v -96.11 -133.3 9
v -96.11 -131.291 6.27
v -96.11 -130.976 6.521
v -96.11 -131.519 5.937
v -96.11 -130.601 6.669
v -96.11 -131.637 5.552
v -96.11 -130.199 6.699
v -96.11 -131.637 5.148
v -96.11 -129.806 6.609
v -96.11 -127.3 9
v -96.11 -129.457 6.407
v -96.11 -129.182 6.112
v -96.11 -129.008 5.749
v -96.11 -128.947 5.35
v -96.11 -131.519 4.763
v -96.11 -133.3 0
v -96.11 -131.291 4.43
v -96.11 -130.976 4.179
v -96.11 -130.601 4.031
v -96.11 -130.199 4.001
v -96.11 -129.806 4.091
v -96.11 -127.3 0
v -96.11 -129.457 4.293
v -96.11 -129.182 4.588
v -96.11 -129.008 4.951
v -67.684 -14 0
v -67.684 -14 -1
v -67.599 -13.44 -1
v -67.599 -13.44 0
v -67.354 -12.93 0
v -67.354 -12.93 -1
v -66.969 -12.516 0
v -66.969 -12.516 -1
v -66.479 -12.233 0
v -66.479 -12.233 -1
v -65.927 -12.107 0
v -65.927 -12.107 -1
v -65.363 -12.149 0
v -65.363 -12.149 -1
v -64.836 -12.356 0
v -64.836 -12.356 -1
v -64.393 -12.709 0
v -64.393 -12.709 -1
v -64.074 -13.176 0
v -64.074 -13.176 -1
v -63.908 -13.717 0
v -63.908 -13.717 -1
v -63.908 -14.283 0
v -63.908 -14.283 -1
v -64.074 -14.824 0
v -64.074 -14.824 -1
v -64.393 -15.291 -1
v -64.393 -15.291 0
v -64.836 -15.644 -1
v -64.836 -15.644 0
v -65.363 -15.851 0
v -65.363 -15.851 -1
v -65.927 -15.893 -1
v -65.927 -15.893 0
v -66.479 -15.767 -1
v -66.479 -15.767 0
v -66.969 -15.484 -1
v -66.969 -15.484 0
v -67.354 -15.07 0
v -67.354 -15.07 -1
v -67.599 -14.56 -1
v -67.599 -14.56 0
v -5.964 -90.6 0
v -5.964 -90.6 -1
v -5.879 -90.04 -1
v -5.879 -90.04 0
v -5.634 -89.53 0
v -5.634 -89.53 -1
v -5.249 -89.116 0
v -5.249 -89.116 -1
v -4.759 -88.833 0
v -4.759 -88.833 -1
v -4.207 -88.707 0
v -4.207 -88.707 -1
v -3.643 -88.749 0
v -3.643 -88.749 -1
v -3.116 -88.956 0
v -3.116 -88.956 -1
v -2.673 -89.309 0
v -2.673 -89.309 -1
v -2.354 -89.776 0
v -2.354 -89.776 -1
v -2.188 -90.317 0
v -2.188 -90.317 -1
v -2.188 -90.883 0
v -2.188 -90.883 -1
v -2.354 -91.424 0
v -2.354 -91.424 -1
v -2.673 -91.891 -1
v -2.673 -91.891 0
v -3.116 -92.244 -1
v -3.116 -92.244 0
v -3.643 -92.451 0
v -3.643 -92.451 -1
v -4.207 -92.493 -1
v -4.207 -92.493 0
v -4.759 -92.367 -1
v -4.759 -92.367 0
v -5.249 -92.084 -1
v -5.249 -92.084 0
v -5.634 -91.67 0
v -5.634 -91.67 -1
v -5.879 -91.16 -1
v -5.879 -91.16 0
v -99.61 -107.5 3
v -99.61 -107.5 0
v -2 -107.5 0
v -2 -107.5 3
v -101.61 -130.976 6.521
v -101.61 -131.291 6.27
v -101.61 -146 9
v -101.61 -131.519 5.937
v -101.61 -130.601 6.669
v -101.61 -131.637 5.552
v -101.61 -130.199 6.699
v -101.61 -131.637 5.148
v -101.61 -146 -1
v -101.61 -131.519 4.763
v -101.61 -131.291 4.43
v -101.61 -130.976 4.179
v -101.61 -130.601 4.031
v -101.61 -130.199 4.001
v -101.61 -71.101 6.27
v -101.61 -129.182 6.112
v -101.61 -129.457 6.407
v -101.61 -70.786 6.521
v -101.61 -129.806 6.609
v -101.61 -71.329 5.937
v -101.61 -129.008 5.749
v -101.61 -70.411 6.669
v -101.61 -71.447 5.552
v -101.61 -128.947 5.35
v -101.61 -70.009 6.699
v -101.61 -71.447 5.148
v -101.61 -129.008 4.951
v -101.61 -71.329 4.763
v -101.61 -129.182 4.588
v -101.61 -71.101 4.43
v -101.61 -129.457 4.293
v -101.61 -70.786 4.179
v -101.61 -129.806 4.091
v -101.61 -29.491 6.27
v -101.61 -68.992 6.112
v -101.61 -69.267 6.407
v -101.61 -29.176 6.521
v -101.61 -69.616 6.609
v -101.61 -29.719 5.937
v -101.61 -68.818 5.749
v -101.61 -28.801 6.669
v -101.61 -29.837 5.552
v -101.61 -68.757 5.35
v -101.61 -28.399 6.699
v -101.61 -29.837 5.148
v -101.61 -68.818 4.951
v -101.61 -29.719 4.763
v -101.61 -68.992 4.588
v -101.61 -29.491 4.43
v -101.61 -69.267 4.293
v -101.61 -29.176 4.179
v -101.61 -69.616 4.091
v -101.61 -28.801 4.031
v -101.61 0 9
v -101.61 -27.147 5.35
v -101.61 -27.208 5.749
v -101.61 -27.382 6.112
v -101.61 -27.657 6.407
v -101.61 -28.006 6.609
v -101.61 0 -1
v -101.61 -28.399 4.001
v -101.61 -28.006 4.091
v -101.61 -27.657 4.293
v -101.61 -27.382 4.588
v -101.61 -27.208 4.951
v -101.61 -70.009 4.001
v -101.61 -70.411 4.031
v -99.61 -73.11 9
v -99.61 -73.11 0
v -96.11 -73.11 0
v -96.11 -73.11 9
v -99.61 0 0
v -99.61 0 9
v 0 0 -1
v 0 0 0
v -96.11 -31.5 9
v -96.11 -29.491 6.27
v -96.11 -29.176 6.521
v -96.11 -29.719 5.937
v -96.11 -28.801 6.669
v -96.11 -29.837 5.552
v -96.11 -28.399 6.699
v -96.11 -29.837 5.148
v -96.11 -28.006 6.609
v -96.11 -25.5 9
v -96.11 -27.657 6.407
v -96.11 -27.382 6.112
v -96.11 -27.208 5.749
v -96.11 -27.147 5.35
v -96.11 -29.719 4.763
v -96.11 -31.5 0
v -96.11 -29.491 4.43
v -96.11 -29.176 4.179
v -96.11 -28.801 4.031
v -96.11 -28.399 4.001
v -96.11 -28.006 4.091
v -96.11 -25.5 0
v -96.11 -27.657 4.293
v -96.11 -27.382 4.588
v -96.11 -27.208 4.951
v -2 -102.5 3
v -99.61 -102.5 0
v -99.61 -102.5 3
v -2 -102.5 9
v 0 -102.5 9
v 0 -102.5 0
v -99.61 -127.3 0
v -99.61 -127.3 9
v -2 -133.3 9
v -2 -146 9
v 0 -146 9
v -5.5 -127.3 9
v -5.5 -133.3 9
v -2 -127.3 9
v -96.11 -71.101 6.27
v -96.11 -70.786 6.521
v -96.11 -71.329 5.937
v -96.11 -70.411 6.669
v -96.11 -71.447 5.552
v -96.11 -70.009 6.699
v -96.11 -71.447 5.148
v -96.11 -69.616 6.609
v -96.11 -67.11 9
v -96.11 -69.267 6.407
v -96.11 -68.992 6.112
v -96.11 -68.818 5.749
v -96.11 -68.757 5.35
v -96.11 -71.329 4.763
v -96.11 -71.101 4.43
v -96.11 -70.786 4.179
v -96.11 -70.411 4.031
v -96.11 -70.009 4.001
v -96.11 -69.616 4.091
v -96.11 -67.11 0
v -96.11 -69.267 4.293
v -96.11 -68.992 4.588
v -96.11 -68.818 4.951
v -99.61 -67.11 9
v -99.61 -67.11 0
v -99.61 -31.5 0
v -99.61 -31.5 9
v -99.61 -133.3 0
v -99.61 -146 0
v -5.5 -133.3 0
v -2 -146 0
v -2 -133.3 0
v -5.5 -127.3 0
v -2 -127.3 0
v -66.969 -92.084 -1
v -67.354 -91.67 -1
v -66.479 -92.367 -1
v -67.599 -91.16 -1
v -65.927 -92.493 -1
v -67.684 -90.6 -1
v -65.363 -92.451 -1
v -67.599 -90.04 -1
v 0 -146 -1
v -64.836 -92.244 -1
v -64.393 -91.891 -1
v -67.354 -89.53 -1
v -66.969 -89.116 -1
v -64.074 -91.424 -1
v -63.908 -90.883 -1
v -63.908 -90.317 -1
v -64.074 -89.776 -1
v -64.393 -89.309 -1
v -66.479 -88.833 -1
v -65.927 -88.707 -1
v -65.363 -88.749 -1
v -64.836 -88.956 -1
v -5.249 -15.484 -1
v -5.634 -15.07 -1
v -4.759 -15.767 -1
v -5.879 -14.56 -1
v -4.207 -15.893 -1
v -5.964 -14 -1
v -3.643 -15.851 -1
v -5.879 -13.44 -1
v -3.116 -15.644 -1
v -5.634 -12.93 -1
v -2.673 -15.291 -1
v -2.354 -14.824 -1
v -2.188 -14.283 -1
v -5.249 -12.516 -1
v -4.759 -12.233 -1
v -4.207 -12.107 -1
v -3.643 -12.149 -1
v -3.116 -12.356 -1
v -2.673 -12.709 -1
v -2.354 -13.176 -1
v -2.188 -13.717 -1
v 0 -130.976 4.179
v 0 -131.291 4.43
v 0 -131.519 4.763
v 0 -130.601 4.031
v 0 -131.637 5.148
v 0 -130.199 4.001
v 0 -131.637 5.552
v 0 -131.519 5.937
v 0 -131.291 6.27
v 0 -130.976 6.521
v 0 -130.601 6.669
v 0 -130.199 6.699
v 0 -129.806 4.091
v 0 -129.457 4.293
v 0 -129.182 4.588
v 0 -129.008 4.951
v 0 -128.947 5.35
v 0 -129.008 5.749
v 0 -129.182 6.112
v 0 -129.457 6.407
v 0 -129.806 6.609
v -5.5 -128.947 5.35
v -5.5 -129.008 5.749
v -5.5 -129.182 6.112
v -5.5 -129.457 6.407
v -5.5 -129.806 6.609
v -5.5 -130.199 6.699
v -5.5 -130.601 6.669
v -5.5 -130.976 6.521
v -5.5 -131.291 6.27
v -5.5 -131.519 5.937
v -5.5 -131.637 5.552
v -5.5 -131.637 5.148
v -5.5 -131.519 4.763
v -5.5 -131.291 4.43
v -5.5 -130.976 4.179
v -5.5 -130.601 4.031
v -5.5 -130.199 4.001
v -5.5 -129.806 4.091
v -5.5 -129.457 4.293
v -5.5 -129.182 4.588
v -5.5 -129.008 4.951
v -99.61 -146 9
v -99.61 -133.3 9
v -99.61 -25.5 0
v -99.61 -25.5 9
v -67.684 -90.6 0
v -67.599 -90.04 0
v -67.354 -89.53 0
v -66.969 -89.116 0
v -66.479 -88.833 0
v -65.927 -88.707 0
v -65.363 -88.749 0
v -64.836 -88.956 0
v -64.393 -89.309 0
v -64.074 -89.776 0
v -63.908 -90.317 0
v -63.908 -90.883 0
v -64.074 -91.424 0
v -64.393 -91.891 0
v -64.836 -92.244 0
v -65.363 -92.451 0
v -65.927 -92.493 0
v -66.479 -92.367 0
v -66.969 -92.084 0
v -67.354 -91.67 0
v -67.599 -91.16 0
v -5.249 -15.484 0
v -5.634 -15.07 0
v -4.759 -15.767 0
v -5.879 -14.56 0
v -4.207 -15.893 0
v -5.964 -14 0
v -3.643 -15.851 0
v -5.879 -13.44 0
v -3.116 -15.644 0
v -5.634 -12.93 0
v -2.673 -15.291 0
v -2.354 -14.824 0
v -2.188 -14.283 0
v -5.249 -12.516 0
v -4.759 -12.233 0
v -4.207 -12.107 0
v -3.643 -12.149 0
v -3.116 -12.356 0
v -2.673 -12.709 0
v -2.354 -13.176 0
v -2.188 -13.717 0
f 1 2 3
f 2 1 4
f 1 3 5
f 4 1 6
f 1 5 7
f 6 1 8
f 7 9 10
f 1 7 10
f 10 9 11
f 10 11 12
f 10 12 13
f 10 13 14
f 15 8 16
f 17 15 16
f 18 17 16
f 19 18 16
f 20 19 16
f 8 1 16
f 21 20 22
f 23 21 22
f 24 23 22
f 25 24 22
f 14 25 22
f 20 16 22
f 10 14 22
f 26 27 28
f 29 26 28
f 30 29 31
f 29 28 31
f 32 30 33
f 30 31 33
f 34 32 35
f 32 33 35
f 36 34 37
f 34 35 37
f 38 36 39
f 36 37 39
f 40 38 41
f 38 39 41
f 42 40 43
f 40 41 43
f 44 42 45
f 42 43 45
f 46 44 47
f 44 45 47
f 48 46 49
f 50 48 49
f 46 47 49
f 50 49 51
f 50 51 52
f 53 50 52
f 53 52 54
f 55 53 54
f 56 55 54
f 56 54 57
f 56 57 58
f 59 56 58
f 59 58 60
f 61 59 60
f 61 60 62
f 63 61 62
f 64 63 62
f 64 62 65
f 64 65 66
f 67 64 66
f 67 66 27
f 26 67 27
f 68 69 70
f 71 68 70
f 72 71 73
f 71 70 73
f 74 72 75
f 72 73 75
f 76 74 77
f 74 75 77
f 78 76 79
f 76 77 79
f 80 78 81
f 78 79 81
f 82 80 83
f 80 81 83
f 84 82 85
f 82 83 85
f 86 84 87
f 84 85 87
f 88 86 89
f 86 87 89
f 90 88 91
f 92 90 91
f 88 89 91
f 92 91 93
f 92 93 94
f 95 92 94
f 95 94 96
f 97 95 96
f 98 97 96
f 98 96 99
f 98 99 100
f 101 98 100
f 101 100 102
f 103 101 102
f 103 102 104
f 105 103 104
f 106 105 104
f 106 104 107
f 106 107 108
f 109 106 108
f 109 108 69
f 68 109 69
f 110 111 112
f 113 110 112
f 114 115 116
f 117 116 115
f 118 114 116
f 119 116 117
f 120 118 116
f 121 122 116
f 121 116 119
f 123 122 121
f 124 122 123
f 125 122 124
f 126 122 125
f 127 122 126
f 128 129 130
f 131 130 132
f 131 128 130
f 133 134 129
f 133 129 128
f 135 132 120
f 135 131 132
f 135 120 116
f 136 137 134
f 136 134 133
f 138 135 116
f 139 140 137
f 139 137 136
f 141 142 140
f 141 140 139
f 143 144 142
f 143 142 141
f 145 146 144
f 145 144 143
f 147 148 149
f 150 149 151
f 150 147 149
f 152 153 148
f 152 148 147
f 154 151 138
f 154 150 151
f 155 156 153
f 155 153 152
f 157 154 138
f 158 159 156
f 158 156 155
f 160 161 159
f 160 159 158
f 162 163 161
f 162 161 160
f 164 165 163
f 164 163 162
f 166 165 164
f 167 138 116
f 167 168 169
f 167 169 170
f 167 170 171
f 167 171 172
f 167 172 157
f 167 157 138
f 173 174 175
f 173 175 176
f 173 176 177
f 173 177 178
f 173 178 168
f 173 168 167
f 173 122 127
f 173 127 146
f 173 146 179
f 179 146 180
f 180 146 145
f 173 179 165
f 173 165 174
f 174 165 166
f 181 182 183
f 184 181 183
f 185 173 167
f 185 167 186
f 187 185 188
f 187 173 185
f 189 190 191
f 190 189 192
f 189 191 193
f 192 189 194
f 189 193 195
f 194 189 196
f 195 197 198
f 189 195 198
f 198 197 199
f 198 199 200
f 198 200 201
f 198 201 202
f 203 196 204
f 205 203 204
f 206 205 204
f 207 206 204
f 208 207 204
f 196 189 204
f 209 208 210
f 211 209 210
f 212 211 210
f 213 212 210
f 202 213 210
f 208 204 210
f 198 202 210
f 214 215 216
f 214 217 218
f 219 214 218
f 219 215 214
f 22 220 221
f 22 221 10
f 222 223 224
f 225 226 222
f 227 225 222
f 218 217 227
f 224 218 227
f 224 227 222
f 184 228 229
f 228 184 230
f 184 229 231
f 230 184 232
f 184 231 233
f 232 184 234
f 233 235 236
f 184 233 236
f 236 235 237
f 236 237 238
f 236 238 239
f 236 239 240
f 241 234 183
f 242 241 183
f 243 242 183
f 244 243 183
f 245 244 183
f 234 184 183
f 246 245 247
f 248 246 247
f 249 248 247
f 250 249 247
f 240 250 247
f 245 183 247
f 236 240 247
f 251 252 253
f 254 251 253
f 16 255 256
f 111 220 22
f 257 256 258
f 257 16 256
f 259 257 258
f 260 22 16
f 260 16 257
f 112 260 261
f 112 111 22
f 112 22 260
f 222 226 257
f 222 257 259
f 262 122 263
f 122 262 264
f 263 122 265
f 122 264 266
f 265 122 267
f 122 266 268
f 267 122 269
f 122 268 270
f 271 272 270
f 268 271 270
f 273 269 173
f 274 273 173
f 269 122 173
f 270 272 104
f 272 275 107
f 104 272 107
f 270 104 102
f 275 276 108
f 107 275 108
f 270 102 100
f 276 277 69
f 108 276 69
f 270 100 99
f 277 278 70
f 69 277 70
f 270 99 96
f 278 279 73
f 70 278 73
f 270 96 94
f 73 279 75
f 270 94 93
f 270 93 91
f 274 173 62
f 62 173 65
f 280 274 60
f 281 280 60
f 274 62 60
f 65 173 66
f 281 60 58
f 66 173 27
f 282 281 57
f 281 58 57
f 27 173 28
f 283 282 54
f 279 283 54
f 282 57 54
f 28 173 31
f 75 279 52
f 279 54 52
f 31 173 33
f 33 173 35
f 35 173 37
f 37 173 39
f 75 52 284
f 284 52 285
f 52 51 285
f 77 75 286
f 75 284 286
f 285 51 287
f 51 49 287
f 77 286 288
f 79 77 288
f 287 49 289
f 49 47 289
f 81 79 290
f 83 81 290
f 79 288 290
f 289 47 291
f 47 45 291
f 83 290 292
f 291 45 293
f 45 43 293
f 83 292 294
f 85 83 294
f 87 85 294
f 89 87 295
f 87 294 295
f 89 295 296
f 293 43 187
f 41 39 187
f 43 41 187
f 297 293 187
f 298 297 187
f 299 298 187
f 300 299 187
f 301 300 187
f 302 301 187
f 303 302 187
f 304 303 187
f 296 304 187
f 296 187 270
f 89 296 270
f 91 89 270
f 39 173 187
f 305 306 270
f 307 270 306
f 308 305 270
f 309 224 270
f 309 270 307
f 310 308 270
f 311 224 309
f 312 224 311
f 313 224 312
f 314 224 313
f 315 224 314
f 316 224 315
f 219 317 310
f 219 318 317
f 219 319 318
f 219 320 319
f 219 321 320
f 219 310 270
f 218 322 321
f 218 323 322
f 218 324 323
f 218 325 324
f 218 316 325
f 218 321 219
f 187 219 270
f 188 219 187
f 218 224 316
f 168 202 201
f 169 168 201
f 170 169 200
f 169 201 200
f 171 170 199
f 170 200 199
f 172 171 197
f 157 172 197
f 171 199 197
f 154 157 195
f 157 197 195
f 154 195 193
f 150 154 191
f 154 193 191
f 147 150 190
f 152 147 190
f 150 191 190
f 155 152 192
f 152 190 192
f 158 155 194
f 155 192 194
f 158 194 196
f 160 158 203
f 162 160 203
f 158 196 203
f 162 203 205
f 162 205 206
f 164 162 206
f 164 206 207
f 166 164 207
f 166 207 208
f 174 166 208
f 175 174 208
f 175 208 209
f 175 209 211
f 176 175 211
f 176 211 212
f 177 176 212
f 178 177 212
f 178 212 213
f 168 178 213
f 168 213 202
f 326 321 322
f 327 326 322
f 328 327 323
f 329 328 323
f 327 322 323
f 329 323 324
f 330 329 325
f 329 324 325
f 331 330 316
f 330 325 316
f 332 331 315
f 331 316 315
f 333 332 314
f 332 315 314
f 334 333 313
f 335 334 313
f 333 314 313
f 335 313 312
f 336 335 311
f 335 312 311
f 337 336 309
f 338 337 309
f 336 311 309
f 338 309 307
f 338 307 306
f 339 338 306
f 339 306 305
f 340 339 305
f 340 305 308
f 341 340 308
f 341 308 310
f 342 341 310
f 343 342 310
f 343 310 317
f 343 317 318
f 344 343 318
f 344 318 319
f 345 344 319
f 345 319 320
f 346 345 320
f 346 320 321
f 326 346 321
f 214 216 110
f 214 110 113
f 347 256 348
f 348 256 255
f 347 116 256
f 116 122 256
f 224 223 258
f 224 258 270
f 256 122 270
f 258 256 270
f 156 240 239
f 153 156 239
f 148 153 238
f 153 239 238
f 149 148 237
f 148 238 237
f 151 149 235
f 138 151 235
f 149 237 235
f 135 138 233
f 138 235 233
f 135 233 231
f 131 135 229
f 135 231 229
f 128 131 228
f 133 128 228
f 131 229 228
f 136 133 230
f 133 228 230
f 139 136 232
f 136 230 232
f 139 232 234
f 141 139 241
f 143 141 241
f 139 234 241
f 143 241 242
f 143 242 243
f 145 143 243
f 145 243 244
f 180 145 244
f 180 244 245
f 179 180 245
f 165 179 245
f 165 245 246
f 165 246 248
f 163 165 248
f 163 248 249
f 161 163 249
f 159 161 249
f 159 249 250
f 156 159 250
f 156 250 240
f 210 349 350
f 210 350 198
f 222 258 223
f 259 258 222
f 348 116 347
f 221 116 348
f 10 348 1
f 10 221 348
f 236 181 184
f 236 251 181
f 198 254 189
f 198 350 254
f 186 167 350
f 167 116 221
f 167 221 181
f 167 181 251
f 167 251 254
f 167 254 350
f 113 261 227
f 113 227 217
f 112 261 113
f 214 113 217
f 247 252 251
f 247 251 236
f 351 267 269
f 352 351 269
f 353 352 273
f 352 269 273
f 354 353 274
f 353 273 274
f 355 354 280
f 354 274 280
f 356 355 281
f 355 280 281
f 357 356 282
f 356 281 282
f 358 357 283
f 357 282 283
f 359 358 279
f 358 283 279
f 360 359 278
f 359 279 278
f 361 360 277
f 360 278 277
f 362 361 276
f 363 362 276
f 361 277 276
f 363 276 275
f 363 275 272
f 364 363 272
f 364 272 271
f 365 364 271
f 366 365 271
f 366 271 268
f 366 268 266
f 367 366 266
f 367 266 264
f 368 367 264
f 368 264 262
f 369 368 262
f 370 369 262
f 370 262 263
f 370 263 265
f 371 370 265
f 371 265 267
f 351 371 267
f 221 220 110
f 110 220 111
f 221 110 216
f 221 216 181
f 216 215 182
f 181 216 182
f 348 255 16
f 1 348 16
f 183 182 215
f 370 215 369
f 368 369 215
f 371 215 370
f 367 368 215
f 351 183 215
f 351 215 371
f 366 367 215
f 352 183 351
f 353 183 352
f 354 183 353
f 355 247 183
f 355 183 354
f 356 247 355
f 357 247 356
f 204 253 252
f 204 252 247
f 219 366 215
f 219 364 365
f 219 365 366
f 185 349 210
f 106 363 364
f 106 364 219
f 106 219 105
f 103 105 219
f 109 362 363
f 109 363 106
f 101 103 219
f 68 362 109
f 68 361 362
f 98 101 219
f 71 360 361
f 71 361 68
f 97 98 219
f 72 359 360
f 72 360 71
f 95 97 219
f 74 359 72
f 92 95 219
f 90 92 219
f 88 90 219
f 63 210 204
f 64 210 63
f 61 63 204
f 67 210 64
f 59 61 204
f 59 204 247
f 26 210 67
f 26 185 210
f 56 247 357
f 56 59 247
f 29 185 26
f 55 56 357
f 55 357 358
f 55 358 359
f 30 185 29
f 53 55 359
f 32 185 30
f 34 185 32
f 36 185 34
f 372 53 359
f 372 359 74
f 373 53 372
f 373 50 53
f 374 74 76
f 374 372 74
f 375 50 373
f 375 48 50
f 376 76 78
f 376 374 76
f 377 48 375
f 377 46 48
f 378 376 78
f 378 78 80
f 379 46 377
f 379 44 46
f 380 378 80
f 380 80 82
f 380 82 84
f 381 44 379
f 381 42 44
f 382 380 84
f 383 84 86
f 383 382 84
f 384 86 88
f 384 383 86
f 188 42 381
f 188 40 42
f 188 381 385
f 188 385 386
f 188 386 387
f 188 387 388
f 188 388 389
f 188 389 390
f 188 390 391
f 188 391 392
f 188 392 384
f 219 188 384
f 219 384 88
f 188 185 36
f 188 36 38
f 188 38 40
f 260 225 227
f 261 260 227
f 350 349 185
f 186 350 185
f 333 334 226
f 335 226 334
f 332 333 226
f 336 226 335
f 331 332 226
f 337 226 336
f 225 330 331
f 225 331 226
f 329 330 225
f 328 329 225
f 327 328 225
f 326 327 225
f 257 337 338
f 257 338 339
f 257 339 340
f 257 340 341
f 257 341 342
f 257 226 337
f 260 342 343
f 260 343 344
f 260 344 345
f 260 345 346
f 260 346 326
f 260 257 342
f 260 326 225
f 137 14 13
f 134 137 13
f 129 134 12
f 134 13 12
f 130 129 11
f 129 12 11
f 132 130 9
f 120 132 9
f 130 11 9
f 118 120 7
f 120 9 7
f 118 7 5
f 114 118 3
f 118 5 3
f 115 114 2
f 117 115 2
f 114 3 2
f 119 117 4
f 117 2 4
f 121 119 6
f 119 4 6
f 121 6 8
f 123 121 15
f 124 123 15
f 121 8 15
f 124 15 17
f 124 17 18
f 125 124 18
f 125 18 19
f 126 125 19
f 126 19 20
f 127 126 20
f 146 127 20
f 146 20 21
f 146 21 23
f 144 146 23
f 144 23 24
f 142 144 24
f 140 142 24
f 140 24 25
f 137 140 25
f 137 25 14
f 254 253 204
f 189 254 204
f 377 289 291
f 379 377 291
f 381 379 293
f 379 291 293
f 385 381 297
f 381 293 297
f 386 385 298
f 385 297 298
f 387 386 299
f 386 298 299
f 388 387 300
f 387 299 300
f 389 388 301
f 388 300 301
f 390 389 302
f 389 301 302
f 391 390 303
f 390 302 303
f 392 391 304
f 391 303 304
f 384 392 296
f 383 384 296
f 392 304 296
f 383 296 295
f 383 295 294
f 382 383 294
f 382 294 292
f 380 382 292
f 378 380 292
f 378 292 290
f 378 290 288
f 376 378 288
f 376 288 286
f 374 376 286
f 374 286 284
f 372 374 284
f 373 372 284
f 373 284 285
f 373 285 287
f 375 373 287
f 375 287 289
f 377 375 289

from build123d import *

# Parameters (mm, degrees)
F0_W      = 101.61
F0_H      = 146
F1_DEPTH  = 1
F3_W      = 2
F3_H      = 146
F3_H_2    = 43.5
F4_DEPTH  = 9
F5_W      = 97.61
F5_H      = 5
F6_DEPTH  = 3
F9_W      = 5.5
F9_H      = 6
F10_DEPTH = 9
F11_D     = 2.7051
F12_D     = 3.7973


with BuildPart() as f1:
    # F0 (on Top) → F1 (new body)
    with BuildSketch(Plane.XY):
        with Locations((-50.805, -73)):
            Rectangle(F0_W, F0_H)
    extrude(amount=-F1_DEPTH)

    # F3 (on Top) → F4 (join)
    with BuildSketch(Plane.XY):
        with Locations((-100.61, -73)):
            Rectangle(F3_W, F3_H)
        with Locations((-1, -124.25)):
            Rectangle(F3_W, F3_H_2)
    extrude(amount=F4_DEPTH)

    # F5 (on face) → F6 (join)
    with BuildSketch(Plane.XY):
        with Locations((-50.805, -105)):
            Rectangle(F5_W, F5_H)
    extrude(amount=F6_DEPTH)

    # F9 (on face) → F10 (join, through all)
    with BuildSketch(Plane.XY):
        with Locations((-98.86, -130.3)):
            Rectangle(F9_W, F9_H)
        with Locations((-98.86, -70.11)):
            Rectangle(F9_W, F9_H)
        with Locations((-98.86, -28.5)):
            Rectangle(F9_W, F9_H)
        with Locations((-2.75, -130.3)):
            Rectangle(F9_W, F9_H)
    extrude(amount=F10_DEPTH)

    # F11 (through all)
    with Locations(Plane(origin=(-101.61, 0, 0), x_dir=(0, -1, 0), z_dir=(-1, 0, 0))):
        with Locations((28.5, 5.35), (70.11, 5.35), (130.3, 5.35)):
            Hole(F11_D / 2)

    # F12 (through all)
    with Locations(Plane.XY):
        with Locations((-65.785, -90.6), (-4.065, -90.6), (-4.065, -14), (-65.785, -14)):
            Hole(F12_D / 2)


solid = f1.part
